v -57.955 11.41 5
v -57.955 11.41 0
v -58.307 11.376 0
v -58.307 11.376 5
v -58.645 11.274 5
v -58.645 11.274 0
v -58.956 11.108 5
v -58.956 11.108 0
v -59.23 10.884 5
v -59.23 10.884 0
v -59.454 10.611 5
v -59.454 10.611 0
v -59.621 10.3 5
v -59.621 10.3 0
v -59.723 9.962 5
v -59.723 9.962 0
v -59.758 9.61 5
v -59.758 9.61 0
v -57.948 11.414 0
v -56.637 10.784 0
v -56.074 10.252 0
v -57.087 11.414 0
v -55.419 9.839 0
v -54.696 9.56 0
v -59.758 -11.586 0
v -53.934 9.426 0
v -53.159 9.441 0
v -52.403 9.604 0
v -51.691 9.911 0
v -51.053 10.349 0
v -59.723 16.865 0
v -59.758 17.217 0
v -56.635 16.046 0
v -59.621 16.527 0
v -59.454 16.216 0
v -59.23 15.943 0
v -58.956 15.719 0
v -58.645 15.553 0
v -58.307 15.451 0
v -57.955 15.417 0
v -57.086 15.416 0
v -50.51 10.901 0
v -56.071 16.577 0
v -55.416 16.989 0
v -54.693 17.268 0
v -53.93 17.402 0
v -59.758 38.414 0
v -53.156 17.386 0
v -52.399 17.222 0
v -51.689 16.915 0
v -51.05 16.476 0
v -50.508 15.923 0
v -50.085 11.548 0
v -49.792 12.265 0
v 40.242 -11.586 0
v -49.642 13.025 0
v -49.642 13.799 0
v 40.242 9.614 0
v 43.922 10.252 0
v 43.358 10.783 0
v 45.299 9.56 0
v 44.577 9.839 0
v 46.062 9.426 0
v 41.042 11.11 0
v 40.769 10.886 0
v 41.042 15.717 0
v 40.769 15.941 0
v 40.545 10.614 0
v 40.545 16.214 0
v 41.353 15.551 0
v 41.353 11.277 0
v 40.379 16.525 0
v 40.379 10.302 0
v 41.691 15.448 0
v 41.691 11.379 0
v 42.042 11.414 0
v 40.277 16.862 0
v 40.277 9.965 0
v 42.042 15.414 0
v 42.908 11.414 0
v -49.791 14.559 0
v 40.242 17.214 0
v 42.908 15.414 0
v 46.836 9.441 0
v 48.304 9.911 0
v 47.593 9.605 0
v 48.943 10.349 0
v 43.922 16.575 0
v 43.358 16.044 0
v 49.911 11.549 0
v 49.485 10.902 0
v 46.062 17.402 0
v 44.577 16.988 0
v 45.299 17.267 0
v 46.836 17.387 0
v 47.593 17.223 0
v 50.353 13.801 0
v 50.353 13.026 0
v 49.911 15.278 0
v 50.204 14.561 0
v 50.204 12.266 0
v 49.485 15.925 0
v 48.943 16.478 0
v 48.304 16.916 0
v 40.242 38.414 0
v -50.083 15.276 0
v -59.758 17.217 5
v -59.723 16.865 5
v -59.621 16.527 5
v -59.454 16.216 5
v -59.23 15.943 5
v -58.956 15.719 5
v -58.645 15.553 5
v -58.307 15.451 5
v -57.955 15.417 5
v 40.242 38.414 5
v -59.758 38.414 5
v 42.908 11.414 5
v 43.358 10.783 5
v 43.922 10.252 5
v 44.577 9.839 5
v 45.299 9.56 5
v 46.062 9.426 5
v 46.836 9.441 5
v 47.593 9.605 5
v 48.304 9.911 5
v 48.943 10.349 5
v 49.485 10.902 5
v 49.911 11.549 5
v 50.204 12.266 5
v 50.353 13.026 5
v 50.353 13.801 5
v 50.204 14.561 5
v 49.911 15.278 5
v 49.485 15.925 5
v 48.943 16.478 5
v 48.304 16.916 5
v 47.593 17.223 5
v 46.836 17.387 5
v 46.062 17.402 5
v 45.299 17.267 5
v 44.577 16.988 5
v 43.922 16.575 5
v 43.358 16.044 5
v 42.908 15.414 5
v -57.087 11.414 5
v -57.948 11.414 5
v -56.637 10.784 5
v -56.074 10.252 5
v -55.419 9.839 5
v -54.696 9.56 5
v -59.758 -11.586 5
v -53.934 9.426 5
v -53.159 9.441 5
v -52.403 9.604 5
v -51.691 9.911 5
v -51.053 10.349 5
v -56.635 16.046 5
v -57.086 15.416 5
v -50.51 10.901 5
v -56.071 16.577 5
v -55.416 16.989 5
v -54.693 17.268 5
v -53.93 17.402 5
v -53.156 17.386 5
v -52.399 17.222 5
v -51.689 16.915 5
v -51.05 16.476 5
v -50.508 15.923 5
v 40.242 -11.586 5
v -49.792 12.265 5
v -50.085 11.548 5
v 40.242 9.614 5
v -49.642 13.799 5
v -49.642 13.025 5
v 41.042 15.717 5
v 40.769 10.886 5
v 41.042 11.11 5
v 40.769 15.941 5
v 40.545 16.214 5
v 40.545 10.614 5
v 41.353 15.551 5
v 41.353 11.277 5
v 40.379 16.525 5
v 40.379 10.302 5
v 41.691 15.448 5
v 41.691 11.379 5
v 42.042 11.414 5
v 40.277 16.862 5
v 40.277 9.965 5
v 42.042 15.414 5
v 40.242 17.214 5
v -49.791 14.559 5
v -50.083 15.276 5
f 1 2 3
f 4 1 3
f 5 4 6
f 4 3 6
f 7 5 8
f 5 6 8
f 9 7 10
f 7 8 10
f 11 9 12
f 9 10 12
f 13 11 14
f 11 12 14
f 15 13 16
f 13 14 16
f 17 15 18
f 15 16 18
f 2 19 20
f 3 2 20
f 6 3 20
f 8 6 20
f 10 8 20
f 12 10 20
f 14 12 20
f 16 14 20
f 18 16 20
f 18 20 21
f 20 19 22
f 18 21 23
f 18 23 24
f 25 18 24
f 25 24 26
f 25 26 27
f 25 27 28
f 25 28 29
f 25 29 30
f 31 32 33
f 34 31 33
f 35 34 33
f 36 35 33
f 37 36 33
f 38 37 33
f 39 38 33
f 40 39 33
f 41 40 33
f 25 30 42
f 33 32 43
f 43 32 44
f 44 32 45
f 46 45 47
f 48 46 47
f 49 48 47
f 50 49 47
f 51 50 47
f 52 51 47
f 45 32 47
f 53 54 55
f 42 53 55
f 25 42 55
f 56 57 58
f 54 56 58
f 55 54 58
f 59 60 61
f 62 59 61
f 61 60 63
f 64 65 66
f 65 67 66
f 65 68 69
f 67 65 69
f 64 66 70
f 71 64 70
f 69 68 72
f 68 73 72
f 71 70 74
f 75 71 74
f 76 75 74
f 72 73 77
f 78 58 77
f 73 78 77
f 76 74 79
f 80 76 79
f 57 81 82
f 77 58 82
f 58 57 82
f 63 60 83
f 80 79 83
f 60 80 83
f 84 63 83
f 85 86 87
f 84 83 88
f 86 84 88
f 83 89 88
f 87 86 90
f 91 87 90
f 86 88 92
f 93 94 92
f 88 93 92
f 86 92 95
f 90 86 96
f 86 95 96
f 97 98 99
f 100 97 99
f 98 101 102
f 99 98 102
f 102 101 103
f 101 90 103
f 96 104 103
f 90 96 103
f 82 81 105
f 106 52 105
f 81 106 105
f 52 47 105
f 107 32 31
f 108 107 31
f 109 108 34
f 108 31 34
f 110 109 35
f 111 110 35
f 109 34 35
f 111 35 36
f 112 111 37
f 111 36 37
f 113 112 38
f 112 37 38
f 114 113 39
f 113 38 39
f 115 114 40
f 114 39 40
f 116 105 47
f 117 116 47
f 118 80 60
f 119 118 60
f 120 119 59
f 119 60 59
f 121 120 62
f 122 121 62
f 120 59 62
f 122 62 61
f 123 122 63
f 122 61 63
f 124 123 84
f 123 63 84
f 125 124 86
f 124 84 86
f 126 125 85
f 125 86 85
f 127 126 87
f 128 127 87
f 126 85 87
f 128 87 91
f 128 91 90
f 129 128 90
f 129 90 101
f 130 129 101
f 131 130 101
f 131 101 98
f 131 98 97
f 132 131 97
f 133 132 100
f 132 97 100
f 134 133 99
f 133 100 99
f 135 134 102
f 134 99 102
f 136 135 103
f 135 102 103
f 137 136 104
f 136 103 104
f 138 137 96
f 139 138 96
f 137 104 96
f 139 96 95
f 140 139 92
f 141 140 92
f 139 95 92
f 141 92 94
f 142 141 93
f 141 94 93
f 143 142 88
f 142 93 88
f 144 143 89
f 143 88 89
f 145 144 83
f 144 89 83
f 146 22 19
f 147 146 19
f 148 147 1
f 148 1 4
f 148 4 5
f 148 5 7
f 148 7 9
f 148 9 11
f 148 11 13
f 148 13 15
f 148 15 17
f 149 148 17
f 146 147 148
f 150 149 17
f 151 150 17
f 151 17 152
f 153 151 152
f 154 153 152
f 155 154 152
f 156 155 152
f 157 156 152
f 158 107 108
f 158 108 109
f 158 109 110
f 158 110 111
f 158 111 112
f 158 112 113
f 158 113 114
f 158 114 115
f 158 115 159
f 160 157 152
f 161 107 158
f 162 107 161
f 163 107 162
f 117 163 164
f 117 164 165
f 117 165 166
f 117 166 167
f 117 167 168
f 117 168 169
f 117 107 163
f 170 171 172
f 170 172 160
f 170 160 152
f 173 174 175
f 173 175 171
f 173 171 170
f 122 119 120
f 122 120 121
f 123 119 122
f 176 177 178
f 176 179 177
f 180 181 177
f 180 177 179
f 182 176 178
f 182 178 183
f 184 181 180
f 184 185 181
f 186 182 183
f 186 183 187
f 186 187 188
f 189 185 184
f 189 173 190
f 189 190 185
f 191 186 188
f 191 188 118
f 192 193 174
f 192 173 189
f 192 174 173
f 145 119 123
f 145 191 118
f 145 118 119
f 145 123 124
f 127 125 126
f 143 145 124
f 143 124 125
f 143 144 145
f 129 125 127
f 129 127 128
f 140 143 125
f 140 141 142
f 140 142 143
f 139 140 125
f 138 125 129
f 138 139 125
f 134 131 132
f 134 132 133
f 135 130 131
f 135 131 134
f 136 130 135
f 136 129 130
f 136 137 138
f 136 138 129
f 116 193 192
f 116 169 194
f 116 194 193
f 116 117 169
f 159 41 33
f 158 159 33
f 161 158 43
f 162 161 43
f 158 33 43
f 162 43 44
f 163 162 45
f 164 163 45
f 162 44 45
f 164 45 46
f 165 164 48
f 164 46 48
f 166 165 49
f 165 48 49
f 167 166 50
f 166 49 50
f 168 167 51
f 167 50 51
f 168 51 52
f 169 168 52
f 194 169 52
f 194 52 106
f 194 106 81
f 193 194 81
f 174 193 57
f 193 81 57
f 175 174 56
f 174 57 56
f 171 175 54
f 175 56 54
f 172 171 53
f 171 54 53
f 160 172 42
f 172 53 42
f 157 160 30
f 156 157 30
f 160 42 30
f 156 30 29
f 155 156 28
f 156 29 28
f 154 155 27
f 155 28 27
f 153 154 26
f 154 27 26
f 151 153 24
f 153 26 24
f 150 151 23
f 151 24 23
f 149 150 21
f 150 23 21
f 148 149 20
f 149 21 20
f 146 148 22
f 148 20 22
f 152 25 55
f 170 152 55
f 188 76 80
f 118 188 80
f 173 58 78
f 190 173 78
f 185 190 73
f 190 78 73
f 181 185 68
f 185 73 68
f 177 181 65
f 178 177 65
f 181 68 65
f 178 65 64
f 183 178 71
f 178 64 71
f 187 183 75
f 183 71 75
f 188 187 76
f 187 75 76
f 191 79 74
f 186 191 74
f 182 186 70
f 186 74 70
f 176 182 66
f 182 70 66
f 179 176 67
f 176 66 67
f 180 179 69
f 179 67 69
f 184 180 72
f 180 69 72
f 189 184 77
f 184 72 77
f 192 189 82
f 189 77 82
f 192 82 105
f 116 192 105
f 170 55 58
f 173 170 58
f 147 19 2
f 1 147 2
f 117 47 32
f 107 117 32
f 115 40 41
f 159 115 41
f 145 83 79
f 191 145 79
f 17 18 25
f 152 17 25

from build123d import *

# Parameters (mm, degrees)
F1_DEPTH = 5


with BuildPart() as f1:
    # F0 (on Top) → F1 (new body)
    with BuildSketch(Plane.XY):
        with BuildLine():
            Line((-9.758077, 38.413576), (-59.758077, 38.413576))
            Line((-59.758077, 38.413576), (-59.758077, 19.413576))
            Line((-59.758077, 19.413576), (-59.758077, 17.216746))
            ThreePointArc((-59.758077, 17.216746), (-59.229749, 15.942835), (-57.954909, 15.416749))
            Line((-57.954909, 15.416749), (-57.085515, 15.41643))
            ThreePointArc((-57.085515, 15.41643), (-49.623063, 13.411928), (-57.087164, 11.413576))
            Line((-57.087164, 11.413576), (-57.948048, 11.413576))
            Line((-57.948048, 11.413576), (-57.954909, 11.410403))
            ThreePointArc((-57.954909, 11.410403), (-59.229749, 10.884318), (-59.758077, 9.610406))
            Line((-59.758077, 9.610406), (-59.758077, 7.413576))
            Line((-59.758077, 7.413576), (-59.758077, -11.586424))
            Line((-59.758077, -11.586424), (-9.758077, -11.586424))
            Line((-9.758077, -11.586424), (-9.758077, 7.413576))
            Line((-9.758077, 7.413576), (-9.758077, 9.610406))
            ThreePointArc((-9.758077, 9.610406), (-9.229749, 10.884318), (-7.954909, 11.410403))
            Line((-7.954909, 11.410403), (-7.948048, 11.413576))
            Line((-7.948048, 11.413576), (-7.087164, 11.413576))
            ThreePointArc((-7.087164, 11.413576), (0.376937, 13.411928), (-7.085515, 15.41643))
            Line((-7.085515, 15.41643), (-7.954909, 15.416749))
            ThreePointArc((-7.954909, 15.416749), (-9.229749, 15.942835), (-9.758077, 17.216746))
            Line((-9.758077, 17.216746), (-9.758077, 19.413576))
            Line((-9.758077, 19.413576), (-9.758077, 38.413576))
        make_face()
        with BuildLine():
            Line((40.241923, 38.413576), (-9.758077, 38.413576))
            Line((-9.758077, 38.413576), (-9.758077, 19.413576))
            Line((-9.758077, 19.413576), (-9.758077, 17.216746))
            ThreePointArc((-9.758077, 17.216746), (-9.229749, 15.942835), (-7.954909, 15.416749))
            Line((-7.954909, 15.416749), (-7.085515, 15.41643))
            ThreePointArc((-7.085515, 15.41643), (0.376937, 13.411928), (-7.087164, 11.413576))
            Line((-7.087164, 11.413576), (-7.948048, 11.413576))
            Line((-7.948048, 11.413576), (-7.954909, 11.410403))
            ThreePointArc((-7.954909, 11.410403), (-9.229749, 10.884318), (-9.758077, 9.610406))
            Line((-9.758077, 9.610406), (-9.758077, 7.413576))
            Line((-9.758077, 7.413576), (-9.758077, -11.586424))
            Line((-9.758077, -11.586424), (40.241923, -11.586424))
            Line((40.241923, -11.586424), (40.241923, 9.613576))
            ThreePointArc((40.241923, 9.613576), (40.769131, 10.886368), (42.041923, 11.413576))
            Line((42.041923, 11.413576), (42.907822, 11.413576))
            ThreePointArc((42.907822, 11.413576), (50.371923, 13.413576), (42.907822, 15.413576))
            Line((42.907822, 15.413576), (42.041923, 15.413576))
            ThreePointArc((42.041923, 15.413576), (40.769131, 15.940784), (40.241923, 17.213576))
            Line((40.241923, 17.213576), (40.241923, 38.413576))
        make_face()
    extrude(amount=F1_DEPTH)


solid = f1.part
